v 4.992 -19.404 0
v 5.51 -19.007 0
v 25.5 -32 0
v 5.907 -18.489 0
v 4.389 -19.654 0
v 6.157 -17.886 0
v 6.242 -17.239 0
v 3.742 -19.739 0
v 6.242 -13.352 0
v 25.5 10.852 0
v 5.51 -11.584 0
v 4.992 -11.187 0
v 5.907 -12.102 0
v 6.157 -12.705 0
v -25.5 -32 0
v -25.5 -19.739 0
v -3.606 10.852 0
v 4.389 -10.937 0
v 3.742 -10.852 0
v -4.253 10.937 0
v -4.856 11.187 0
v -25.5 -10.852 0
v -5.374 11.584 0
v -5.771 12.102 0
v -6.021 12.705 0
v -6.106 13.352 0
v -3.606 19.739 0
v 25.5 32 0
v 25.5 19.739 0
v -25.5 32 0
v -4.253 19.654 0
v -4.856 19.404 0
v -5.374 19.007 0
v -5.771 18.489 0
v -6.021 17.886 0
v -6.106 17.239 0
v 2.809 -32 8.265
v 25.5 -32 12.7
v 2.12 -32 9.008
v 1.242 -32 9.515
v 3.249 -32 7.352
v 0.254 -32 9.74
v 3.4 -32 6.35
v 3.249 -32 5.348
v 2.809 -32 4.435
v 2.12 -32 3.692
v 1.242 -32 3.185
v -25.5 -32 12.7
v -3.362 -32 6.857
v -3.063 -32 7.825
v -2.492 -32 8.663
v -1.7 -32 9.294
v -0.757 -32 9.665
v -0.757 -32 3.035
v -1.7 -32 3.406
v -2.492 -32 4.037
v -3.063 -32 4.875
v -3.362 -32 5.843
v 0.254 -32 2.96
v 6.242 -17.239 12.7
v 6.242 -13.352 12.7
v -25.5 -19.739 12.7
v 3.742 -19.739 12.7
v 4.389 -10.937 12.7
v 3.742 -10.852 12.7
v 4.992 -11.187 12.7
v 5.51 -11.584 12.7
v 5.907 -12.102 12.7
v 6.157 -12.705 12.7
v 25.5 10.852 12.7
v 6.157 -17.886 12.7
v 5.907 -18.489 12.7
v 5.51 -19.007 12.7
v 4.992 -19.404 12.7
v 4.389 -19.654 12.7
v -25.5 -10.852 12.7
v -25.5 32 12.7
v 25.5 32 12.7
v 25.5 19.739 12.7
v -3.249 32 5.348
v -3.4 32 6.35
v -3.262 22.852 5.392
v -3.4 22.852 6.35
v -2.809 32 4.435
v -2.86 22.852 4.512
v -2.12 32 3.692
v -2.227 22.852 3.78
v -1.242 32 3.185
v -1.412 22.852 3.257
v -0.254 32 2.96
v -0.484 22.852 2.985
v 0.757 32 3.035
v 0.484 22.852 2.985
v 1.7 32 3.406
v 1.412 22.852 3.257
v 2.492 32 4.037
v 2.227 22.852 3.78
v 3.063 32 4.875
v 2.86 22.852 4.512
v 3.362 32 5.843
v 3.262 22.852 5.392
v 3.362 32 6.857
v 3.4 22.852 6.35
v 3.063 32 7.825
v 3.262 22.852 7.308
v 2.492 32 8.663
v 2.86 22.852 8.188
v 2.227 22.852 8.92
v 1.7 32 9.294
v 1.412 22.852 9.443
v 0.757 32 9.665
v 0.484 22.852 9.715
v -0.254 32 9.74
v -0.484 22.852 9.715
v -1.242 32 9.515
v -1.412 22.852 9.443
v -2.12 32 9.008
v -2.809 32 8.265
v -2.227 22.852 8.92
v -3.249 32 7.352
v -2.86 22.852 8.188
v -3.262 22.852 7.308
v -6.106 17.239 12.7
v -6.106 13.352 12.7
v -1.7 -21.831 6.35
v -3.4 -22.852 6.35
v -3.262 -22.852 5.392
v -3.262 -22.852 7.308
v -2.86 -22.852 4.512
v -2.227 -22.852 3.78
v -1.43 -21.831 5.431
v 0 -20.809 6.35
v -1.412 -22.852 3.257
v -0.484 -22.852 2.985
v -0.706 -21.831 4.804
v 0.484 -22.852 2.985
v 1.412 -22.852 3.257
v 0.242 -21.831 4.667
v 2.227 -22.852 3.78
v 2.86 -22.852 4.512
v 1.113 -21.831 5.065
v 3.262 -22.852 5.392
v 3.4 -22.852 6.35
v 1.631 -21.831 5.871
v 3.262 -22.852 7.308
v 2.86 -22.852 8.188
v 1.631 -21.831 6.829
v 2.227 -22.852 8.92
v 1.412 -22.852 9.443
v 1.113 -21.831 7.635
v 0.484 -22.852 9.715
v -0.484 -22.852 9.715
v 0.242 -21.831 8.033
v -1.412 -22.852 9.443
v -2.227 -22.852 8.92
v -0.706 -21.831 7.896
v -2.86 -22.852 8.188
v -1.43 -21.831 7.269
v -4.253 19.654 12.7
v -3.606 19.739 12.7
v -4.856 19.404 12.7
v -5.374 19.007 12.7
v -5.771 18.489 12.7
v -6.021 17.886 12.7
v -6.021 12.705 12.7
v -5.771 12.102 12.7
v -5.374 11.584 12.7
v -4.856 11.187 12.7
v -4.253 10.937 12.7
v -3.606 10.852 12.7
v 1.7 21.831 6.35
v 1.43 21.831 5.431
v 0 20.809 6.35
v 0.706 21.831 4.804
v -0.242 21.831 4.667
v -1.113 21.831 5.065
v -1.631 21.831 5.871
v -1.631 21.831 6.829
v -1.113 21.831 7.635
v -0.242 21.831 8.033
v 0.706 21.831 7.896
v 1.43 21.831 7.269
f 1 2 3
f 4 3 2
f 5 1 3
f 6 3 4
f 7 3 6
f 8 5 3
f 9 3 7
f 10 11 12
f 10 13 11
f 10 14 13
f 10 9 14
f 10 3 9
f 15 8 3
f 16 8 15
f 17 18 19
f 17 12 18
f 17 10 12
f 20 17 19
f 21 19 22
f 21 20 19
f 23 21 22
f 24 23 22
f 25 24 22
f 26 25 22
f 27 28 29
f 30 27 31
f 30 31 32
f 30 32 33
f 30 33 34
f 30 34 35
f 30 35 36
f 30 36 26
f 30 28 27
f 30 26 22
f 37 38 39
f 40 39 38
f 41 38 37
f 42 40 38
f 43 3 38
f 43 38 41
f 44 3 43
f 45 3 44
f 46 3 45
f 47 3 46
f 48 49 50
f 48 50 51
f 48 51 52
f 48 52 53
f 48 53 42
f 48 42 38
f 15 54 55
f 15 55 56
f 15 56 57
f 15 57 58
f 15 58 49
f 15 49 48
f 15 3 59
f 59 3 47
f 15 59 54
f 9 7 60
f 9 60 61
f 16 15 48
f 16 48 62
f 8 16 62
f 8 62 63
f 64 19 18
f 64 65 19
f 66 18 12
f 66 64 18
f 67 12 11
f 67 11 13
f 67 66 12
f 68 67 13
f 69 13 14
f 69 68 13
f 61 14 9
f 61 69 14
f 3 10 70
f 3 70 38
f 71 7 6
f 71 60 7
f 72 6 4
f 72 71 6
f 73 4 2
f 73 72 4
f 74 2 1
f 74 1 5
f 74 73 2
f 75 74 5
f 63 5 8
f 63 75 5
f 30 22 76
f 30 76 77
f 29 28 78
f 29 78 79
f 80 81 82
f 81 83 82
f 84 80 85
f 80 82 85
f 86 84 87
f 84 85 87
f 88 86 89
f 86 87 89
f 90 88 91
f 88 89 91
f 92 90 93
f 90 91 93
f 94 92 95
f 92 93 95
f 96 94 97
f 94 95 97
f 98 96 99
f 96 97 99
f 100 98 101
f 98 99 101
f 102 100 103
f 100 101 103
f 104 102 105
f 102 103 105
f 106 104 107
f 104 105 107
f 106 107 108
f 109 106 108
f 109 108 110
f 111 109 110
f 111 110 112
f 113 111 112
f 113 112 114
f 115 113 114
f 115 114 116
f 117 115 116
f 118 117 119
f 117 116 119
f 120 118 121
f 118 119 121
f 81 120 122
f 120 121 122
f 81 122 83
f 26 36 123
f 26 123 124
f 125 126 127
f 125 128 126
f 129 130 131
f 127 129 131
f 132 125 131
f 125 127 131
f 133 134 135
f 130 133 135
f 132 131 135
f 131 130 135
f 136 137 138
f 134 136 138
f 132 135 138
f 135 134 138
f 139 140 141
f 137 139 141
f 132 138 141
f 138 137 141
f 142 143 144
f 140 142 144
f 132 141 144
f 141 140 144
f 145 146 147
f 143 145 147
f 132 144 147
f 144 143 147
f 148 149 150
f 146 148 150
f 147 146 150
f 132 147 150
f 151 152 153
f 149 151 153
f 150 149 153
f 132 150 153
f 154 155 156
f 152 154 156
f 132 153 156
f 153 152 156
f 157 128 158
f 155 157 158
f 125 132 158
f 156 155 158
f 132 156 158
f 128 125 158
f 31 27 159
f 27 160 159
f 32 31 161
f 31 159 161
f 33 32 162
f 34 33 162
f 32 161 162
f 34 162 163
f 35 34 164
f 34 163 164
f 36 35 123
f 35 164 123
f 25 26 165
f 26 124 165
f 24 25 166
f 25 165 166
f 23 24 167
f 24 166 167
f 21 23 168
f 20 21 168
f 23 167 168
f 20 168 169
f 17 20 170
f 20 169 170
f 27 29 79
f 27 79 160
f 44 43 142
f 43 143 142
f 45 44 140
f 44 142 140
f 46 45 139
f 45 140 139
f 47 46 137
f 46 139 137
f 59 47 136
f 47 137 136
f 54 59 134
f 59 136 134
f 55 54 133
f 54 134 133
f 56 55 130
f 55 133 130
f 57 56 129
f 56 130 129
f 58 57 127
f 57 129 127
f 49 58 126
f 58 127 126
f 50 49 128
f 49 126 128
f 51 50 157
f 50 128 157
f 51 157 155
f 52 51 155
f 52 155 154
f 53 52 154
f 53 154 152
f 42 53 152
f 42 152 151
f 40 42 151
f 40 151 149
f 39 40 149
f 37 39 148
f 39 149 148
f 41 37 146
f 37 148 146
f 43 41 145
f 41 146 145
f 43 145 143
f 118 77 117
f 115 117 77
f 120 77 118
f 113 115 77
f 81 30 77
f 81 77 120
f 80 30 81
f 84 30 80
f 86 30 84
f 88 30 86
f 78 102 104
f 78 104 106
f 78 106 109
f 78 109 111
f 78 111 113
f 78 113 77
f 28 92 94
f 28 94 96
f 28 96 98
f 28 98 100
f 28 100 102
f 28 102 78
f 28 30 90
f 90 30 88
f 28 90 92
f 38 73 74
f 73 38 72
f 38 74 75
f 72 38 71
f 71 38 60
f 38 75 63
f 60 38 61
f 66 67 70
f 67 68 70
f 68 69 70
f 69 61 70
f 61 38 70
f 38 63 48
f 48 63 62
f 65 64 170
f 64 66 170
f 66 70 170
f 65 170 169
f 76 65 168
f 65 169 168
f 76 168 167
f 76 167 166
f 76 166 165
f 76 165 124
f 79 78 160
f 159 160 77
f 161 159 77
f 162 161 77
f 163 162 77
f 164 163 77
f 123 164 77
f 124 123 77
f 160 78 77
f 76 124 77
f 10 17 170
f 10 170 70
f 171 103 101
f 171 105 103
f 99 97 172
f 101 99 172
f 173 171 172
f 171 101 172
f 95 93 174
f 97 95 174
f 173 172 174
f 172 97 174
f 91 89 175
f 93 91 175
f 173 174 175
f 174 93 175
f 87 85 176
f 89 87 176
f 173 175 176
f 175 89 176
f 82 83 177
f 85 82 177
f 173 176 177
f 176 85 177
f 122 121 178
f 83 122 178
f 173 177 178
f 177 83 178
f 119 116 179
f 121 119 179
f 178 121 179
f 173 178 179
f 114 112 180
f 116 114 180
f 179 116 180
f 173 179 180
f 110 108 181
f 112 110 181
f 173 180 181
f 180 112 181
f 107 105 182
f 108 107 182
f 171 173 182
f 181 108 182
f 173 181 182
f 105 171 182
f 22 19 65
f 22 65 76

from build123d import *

# Parameters (mm, degrees)
BOSS_EXTRUDE1_DEPTH        = 12.7
M8X1_25_TAPPED_HOLE1_D     = 6.8
M8X1_25_TAPPED_HOLE1_DEPTH = 9.147932364
M8X1_25_TAPPED_HOLE1_TIP   = 2.042926105
M8X1_25_TAPPED_HOLE2_D     = 6.8
M8X1_25_TAPPED_HOLE2_DEPTH = 9.147932364
M8X1_25_TAPPED_HOLE2_TIP   = 2.042926105
FILLET3_R                  = 2.5
FILLET5_R                  = 2.5
FILLET6_R                  = 2.5
FILLET7_R                  = 2.5


with BuildPart() as part:
    # Sketch1 → Boss-Extrude1 (new body)
    with BuildSketch(Plane.XY):
        Polygon((25.5, 32), (25.5, 19.738981448), (-6.106181157, 19.738981448), (-6.106181157, 10.852067636), (25.5, 10.852067636), (25.5, -32), (-25.5, -32), (-25.5, -19.738981448), (6.242414697, -19.738981448), (6.242414697, -10.852067636), (-25.5, -10.852067636), (-25.5, 32), align=None)
    extrude(amount=BOSS_EXTRUDE1_DEPTH)

    # M8x1.25 Tapped Hole1
    with Locations(Plane(origin=(0, 32, 0), x_dir=(1, 0, 0), z_dir=(0, 1, 0))):
        with Locations((0, -6.35)):
            Hole(M8X1_25_TAPPED_HOLE1_D / 2, depth=M8X1_25_TAPPED_HOLE1_DEPTH)
            with Locations((0, 0, -(M8X1_25_TAPPED_HOLE1_DEPTH + M8X1_25_TAPPED_HOLE1_TIP / 2))):  # 118° drill point
                Cone(0, M8X1_25_TAPPED_HOLE1_D / 2, M8X1_25_TAPPED_HOLE1_TIP, mode=Mode.SUBTRACT)

    # M8x1.25 Tapped Hole2
    with Locations(Plane(origin=(0, -32, 0), x_dir=(-1, 0, 0), z_dir=(0, -1, 0))):
        with Locations((0, -6.35)):
            Hole(M8X1_25_TAPPED_HOLE2_D / 2, depth=M8X1_25_TAPPED_HOLE2_DEPTH)
            with Locations((0, 0, -(M8X1_25_TAPPED_HOLE2_DEPTH + M8X1_25_TAPPED_HOLE2_TIP / 2))):  # 118° drill point
                Cone(0, M8X1_25_TAPPED_HOLE2_D / 2, M8X1_25_TAPPED_HOLE2_TIP, mode=Mode.SUBTRACT)

    # Fillet3
    fillet3_edges = [part.edges().sort_by_distance(p)[0] for p in [
        (-6.106181157, 19.738981448, 6.35),
    ]]
    fillet(fillet3_edges, radius=FILLET3_R)

    # Fillet5
    fillet5_edges = [part.edges().sort_by_distance(p)[0] for p in [
        (-6.106181157, 10.852067636, 6.35),
    ]]
    fillet(fillet5_edges, radius=FILLET5_R)

    # Fillet6
    fillet6_edges = [part.edges().sort_by_distance(p)[0] for p in [
        (6.242414697, -10.852067636, 6.35),
    ]]
    fillet(fillet6_edges, radius=FILLET6_R)

    # Fillet7
    fillet7_edges = [part.edges().sort_by_distance(p)[0] for p in [
        (6.242414697, -19.738981448, 6.35),
    ]]
    fillet(fillet7_edges, radius=FILLET7_R)


solid = part.part
